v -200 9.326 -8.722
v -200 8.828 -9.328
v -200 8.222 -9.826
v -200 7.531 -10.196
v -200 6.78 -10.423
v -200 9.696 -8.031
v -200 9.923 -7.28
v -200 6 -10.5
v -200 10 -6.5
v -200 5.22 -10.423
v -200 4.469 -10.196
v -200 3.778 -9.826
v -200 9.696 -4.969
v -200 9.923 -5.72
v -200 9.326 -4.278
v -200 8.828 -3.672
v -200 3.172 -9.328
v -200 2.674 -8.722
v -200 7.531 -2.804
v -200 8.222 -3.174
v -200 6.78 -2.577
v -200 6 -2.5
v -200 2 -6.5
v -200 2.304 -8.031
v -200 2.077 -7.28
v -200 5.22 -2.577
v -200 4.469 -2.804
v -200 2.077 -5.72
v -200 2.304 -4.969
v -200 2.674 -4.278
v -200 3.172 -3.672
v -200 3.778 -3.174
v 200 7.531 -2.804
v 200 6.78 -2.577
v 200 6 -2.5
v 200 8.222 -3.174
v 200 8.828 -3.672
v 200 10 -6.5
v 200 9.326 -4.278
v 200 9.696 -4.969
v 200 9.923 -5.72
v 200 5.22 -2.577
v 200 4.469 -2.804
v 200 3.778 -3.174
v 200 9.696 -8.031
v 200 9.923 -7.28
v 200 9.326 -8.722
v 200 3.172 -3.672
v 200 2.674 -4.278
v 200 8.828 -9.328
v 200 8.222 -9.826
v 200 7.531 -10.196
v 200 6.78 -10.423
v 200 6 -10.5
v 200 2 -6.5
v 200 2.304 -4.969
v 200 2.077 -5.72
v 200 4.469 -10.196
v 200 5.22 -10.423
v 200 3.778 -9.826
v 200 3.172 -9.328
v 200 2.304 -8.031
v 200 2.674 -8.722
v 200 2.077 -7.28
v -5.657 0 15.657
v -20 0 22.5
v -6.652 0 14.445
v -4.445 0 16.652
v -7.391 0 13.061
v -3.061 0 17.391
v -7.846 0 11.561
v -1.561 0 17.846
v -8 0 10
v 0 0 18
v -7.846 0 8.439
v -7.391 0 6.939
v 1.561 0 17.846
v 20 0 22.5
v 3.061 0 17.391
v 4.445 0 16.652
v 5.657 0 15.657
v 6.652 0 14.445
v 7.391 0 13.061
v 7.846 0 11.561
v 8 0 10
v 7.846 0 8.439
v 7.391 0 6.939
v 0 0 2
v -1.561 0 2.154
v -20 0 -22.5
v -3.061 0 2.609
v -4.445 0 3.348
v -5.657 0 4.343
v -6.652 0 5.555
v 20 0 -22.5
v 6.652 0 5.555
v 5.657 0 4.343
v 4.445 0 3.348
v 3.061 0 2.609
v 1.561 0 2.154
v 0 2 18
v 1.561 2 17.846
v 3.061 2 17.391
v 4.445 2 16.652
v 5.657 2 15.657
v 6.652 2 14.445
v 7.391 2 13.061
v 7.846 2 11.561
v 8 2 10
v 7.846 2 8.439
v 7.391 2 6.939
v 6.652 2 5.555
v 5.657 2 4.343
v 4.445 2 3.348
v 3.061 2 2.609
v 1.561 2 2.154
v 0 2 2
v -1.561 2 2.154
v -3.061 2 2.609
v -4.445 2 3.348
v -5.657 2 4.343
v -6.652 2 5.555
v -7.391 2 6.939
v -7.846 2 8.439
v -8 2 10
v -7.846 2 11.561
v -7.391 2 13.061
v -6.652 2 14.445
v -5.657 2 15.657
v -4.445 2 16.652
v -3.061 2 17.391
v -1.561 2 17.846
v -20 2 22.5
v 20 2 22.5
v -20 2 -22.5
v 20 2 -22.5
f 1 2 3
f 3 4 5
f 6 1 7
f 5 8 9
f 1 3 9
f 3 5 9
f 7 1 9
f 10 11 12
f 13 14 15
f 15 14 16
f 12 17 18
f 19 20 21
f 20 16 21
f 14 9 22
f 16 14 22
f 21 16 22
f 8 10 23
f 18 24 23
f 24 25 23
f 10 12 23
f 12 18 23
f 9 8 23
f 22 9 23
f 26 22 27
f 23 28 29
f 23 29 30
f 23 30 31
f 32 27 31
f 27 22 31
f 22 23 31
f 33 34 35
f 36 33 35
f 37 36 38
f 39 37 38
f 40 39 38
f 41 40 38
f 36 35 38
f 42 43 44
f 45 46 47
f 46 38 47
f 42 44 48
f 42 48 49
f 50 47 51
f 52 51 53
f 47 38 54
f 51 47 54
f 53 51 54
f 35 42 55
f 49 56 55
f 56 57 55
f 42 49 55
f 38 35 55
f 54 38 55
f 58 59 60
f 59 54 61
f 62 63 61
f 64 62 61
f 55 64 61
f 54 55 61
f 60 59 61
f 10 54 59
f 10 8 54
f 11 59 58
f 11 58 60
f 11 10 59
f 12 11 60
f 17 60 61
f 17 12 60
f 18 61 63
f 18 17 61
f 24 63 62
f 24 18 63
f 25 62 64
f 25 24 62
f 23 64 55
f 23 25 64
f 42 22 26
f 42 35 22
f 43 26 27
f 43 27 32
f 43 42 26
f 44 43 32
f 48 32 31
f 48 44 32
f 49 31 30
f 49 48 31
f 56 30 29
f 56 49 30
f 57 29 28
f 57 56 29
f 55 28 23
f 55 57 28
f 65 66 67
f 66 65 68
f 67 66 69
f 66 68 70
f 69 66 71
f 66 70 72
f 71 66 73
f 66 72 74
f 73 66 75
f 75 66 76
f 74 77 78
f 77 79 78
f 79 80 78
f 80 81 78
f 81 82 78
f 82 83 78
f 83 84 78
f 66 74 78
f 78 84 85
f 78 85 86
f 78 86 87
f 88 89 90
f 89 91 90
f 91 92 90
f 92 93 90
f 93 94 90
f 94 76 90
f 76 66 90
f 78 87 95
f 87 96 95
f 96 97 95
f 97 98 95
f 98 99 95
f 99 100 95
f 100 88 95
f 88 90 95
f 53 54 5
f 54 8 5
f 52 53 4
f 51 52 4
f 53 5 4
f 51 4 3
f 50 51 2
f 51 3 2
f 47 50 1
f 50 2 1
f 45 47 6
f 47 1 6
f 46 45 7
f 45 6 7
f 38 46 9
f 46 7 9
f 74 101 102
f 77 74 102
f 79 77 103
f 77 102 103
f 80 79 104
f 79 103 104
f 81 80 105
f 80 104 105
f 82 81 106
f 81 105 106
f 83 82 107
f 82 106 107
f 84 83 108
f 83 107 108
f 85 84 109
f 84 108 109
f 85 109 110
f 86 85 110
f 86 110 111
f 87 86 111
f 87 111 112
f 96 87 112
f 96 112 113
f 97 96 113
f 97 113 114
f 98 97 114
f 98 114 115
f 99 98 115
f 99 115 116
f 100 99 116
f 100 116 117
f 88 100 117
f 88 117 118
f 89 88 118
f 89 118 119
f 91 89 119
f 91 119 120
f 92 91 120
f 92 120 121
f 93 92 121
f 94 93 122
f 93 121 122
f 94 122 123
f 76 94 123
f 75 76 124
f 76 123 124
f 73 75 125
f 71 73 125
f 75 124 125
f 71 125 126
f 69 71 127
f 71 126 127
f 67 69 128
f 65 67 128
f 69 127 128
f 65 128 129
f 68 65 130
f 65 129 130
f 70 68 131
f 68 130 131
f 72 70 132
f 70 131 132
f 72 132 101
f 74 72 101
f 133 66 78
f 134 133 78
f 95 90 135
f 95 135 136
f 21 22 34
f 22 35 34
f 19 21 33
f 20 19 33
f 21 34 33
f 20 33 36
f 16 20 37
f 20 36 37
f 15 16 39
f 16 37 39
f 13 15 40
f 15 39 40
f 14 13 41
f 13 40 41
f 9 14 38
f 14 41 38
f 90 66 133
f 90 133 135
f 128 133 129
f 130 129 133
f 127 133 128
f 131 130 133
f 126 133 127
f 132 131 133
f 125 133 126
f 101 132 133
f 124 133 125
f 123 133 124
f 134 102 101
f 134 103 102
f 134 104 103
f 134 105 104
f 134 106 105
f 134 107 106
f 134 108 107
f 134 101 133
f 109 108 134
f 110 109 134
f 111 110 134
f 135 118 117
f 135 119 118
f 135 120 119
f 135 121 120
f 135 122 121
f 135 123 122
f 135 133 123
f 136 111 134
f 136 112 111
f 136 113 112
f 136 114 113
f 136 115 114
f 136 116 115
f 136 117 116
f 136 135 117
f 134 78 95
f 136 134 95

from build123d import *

# Parameters (mm, degrees)
SKETCH3_W           = 40
SKETCH3_H           = 45
BOSS_EXTRUDE1_DEPTH = 2
BOSS_EXTRUDE3_DEPTH = 8
FILLET2_R           = 4
SKETCH5_R           = 8
CUT_EXTRUDE1_DEPTH  = 202.420579882


with BuildPart() as part:
    # Sketch3 → Boss-Extrude1 (new body)
    with BuildSketch(Plane(origin=(0, 0, 0), x_dir=(1, 0, 0), z_dir=(0, 1, 0))):
        Rectangle(SKETCH3_W, SKETCH3_H)
    extrude(amount=BOSS_EXTRUDE1_DEPTH)

    # Sketch5 → Cut-Extrude1 (cut, through all)
    with BuildSketch(Plane(origin=(0, 2, 0), x_dir=(1, 0, 0), z_dir=(0, 1, 0))):
        with Locations(Location((0, -10, 0), (0, 0, 270))):
            Circle(SKETCH5_R)
    extrude(amount=-CUT_EXTRUDE1_DEPTH, mode=Mode.SUBTRACT)


with BuildPart() as body_2:
    # Sketch4 → Boss-Extrude3 (new body)
    with BuildSketch(Plane(origin=(0, 2, 0), x_dir=(1, 0, 0), z_dir=(0, 1, 0))):
        Polygon((-200, 10.5), (-200, 2.5), (0, 2.5), (200, 2.5), (200, 10.5), align=None)
    extrude(amount=BOSS_EXTRUDE3_DEPTH)

    # Fillet2
    fillet2_edges = [body_2.edges().sort_by_distance(p)[0] for p in [
        (0, 2, -10.5),
        (0, 2, -2.5),
        (0, 10, -2.5),
        (0, 10, -10.5),
    ]]
    fillet(fillet2_edges, radius=FILLET2_R - 0.0001)  # a hair under: the kernel refuses the full size


solid = Compound([part.part, body_2.part])
